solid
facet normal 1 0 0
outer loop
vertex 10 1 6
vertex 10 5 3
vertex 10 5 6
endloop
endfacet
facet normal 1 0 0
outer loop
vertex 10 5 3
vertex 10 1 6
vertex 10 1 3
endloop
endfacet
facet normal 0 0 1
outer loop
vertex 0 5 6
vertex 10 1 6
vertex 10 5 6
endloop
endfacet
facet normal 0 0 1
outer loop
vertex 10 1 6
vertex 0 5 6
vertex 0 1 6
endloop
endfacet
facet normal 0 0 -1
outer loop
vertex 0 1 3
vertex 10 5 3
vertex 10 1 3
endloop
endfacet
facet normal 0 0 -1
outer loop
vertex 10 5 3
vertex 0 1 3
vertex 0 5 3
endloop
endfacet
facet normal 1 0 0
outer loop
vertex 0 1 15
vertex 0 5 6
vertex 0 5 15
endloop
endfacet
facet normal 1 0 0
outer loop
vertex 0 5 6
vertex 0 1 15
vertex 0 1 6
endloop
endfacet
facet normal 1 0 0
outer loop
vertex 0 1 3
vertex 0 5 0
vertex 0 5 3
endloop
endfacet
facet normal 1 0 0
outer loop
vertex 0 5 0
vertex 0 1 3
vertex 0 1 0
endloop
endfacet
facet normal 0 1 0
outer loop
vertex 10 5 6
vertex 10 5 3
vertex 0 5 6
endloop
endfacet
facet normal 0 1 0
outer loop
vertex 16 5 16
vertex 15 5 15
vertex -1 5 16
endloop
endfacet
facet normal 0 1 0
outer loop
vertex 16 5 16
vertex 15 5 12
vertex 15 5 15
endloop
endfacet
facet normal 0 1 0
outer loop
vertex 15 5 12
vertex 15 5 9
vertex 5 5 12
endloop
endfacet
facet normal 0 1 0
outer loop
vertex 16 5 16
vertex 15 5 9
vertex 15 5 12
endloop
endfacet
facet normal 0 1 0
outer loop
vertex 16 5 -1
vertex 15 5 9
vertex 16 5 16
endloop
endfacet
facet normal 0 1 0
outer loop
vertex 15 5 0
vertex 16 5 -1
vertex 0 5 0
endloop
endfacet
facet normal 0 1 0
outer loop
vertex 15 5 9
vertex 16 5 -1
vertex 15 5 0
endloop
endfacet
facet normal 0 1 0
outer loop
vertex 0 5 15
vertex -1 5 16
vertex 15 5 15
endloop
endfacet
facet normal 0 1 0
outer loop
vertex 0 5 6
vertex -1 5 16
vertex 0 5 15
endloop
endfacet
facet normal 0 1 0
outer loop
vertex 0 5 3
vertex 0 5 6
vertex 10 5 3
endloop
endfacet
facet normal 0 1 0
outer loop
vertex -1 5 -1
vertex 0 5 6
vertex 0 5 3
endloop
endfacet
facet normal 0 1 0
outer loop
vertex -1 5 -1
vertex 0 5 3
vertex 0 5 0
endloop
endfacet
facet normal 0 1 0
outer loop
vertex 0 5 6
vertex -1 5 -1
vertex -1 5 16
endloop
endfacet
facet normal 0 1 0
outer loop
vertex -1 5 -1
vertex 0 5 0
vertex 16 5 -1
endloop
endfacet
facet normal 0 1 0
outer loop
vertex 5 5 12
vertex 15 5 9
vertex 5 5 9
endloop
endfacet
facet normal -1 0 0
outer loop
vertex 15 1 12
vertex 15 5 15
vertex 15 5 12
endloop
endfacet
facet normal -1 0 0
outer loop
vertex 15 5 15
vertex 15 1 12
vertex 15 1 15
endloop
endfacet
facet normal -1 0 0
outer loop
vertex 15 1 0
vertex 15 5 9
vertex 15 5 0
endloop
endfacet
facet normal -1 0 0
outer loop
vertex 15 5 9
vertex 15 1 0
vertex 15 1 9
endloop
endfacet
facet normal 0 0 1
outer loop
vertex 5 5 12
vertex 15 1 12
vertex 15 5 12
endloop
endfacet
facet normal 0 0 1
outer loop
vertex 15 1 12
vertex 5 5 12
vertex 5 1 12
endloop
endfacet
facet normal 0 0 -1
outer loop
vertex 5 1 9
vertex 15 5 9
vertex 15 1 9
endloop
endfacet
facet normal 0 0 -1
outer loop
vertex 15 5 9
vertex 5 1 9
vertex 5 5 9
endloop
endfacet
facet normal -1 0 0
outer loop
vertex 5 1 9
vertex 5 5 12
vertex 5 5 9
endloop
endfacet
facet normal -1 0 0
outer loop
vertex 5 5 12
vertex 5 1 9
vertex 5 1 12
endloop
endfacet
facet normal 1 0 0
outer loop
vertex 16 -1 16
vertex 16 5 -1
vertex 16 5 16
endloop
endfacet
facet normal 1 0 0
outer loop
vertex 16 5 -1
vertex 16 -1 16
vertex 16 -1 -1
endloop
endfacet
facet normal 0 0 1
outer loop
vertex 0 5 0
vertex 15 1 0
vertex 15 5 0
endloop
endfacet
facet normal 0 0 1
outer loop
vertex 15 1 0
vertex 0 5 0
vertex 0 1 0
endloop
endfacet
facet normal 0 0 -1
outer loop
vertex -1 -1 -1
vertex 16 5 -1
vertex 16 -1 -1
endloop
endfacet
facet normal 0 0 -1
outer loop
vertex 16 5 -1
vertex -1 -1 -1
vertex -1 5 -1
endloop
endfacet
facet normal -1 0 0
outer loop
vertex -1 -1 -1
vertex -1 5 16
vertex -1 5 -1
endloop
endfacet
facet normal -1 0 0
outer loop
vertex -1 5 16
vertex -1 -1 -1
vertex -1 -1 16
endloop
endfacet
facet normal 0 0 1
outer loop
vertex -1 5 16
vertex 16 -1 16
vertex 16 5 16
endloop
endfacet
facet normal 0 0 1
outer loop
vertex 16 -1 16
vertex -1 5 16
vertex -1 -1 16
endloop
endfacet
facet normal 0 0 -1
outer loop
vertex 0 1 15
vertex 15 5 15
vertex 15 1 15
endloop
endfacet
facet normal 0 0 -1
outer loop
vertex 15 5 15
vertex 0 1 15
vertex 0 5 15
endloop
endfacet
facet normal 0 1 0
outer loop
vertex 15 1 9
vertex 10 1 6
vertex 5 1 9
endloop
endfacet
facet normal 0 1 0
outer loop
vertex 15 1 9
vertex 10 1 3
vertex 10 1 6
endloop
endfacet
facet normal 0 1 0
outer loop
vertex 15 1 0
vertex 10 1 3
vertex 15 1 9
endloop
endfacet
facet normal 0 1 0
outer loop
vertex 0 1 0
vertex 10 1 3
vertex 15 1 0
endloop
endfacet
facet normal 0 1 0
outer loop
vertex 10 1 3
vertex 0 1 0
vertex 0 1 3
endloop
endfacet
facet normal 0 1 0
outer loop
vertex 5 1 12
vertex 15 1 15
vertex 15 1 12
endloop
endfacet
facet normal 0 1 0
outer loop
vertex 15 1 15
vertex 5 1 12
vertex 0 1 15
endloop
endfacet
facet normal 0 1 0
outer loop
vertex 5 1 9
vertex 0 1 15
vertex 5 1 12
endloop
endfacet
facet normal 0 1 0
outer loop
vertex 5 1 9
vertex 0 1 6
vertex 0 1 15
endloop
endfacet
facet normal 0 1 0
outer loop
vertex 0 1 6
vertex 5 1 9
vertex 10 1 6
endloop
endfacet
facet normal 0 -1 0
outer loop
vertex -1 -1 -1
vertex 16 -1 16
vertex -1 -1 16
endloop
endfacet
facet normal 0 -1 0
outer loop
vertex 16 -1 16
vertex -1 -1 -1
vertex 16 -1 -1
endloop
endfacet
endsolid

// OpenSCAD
// Display
    
// obstacles
translate([5, 2.5, -1.5+6])
    cube([10,5,3], center=true);
    
translate([10, 2.5, -1.5+12])
    cube([10,5,3], center=true);
  
  
// side walls
translate([7.5, 2.5, -0.5])
    cube([17,5,1], center=true);
    
translate([7.5, 2.5, -0.5+16])
    cube([17,5,1], center=true);
    
translate([0.5+15, 2.5, 7.5])
    cube([1,5,16], center=true);
    
translate([-0.5, 2.5, 7.5])
    cube([1,5,16], center=true);
    
// bottom
translate([7.5, 0, 7.5])
    cube([17,2,17], center=true);
  
